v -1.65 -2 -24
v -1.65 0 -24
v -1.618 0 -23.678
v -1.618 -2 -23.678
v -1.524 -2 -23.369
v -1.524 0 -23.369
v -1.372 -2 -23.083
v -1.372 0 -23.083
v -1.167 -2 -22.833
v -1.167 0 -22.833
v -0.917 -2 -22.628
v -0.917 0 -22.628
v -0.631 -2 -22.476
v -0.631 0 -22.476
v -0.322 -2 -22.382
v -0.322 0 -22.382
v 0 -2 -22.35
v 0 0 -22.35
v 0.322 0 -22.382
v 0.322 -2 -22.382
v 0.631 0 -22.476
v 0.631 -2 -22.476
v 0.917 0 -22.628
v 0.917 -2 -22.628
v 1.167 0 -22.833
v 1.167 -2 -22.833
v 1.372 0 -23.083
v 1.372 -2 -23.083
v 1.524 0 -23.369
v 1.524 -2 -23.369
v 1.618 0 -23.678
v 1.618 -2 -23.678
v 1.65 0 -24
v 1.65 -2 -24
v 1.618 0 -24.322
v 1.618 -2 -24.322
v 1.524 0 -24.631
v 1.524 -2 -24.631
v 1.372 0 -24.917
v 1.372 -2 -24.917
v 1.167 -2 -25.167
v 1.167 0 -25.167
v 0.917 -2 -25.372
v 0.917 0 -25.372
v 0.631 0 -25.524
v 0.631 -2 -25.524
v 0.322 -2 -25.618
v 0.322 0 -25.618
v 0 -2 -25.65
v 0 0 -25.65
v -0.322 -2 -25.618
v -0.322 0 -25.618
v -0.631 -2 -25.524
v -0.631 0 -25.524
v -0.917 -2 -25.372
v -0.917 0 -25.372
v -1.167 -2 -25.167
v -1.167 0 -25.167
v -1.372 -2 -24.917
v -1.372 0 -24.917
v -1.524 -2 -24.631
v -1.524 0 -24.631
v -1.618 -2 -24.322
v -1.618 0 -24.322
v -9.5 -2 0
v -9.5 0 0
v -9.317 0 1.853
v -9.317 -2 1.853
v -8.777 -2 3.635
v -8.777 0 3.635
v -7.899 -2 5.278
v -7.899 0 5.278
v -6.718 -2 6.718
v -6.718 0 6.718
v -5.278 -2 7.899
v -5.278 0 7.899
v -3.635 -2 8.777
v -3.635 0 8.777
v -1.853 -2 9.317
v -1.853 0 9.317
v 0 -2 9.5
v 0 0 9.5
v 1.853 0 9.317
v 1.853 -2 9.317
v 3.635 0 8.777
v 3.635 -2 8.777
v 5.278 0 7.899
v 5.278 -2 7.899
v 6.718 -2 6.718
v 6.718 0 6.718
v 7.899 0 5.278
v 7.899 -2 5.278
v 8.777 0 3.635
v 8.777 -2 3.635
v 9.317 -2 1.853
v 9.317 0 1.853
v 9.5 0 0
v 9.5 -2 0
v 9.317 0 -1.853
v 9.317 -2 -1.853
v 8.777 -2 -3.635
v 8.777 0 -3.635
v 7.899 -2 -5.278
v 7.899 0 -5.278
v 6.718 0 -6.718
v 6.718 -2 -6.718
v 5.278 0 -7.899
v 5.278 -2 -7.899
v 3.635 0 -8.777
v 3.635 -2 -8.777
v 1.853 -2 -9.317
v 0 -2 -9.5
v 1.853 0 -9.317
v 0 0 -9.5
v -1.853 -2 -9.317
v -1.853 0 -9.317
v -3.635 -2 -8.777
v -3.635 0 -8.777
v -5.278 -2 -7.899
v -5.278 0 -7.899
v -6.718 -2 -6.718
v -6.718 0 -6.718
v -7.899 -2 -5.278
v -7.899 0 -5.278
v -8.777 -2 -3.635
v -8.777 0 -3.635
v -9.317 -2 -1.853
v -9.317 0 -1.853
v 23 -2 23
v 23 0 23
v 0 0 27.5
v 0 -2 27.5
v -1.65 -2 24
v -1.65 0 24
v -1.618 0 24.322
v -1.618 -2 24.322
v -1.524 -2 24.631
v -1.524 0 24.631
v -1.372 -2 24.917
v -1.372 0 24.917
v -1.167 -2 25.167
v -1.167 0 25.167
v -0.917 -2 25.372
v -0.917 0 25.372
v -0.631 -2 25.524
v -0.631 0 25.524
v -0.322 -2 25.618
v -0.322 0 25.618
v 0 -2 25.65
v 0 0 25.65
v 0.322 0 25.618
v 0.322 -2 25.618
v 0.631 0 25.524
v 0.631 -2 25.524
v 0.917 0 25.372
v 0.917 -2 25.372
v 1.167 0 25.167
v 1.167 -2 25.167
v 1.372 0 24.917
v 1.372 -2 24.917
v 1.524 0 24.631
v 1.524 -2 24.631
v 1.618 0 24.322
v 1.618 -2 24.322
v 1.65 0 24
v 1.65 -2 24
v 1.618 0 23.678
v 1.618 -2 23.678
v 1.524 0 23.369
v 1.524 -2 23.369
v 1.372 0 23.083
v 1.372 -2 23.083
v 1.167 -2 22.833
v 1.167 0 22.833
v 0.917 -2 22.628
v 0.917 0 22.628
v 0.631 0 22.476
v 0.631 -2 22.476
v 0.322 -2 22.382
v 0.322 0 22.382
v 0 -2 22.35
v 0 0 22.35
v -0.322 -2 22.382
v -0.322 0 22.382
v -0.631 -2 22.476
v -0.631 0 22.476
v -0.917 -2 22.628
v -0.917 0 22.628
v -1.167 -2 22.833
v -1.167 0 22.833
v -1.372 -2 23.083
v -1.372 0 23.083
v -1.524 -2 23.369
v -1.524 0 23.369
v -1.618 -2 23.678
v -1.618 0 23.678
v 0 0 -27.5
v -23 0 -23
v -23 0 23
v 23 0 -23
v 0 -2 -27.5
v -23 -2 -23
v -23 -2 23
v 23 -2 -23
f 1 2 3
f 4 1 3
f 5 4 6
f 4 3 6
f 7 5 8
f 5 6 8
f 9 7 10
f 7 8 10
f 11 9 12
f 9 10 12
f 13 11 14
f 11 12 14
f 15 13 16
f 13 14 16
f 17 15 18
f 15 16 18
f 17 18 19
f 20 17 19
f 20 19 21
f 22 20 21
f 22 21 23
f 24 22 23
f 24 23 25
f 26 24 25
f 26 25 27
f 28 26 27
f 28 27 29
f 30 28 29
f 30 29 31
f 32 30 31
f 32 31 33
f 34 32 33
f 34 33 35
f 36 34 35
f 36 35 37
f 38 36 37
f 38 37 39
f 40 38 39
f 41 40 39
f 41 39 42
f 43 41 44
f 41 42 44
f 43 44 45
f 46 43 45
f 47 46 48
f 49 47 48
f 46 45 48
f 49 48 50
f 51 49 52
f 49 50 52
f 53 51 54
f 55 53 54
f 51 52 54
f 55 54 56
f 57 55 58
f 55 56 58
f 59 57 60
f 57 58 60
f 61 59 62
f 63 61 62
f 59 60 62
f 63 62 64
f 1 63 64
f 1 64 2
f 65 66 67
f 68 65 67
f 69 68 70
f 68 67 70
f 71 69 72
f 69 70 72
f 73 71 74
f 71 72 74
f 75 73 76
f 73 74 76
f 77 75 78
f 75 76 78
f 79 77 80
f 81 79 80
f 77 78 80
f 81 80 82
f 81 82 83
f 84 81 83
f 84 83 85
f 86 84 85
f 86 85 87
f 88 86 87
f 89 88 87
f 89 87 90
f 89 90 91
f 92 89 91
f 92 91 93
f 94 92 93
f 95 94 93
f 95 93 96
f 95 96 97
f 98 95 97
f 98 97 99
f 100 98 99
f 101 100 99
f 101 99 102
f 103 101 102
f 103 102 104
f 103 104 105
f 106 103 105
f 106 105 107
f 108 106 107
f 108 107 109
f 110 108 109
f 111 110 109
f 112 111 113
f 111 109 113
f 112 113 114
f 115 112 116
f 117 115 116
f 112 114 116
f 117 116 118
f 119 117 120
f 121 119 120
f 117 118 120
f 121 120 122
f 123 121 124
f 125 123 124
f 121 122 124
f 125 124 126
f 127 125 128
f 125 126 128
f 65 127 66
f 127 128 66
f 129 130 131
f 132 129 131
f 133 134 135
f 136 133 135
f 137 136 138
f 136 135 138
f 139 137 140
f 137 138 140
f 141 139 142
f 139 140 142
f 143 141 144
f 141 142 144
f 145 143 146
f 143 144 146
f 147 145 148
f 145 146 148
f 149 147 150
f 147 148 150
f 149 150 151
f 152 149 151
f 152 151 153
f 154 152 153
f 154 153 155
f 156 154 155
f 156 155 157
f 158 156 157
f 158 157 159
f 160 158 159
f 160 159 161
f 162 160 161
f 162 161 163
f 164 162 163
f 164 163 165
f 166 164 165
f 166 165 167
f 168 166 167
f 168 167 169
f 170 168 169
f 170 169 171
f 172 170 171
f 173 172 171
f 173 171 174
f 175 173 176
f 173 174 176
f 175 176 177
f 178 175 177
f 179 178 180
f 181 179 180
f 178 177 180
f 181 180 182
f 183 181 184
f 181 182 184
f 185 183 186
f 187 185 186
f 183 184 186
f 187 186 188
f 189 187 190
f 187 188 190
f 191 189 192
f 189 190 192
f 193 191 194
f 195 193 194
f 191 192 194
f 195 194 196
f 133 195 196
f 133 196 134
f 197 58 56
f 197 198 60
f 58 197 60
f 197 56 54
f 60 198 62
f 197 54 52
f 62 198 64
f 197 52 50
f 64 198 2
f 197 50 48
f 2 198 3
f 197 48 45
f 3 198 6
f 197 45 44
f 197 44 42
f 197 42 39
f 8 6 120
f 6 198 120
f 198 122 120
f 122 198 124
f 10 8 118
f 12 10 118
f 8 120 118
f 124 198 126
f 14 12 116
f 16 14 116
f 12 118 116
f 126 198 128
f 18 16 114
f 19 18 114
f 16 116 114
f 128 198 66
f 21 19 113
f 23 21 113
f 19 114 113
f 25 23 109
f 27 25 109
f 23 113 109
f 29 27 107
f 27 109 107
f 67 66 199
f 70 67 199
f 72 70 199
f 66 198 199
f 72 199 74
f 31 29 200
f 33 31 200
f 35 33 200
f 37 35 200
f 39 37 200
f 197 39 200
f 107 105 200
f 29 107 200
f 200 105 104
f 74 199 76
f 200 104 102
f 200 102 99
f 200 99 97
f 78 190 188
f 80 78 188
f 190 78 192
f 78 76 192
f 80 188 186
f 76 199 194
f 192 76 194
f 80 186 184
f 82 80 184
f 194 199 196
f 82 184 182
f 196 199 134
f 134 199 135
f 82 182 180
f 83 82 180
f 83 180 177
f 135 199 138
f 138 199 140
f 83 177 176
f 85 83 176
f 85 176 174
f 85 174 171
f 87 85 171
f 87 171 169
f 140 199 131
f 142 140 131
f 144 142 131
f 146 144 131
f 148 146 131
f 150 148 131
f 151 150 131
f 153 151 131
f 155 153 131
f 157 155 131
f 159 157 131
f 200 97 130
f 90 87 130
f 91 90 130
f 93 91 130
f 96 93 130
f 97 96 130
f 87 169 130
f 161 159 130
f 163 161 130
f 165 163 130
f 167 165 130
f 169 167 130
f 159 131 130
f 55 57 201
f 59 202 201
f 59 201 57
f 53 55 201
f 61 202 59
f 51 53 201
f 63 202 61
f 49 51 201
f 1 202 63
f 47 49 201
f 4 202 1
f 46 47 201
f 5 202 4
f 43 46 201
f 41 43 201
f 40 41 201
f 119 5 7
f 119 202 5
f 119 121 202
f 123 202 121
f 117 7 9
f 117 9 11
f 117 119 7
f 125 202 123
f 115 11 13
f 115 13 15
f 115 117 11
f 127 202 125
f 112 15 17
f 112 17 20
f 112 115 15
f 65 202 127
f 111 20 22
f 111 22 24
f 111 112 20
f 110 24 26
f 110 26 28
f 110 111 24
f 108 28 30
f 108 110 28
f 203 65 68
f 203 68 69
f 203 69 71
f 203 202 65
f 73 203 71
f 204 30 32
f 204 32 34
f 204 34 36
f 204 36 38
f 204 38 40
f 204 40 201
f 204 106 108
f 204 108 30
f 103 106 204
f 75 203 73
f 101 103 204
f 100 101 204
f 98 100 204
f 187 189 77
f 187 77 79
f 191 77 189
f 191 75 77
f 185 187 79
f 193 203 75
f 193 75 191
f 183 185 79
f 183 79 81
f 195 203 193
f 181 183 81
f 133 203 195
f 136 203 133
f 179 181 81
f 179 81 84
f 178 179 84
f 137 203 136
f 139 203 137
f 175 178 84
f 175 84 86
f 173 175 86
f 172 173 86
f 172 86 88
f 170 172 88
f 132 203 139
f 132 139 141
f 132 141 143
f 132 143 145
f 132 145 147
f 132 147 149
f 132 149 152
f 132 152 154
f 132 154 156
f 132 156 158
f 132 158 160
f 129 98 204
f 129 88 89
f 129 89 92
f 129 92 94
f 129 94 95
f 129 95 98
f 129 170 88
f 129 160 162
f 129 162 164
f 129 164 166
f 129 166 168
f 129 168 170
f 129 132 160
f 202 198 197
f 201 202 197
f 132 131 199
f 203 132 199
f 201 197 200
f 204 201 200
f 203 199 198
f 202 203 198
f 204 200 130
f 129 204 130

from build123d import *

# Parameters (mm, degrees)
F1_DEPTH = 2
F2_R     = 9.5
F3_DEPTH = 25
F6_D     = 3.3


with BuildPart() as f1:
    # F0 (on Front) → F1 (new body)
    with BuildSketch(Plane.XZ):
        Polygon((23, -19), (23, 23), (-23, 23), (-23, -23), (23, -23), align=None)
        Polygon((-23, 23), (23, 23), (0, 27.5), align=None)
        Polygon((23, -23), (-23, -23), (0, -27.5), align=None)
    extrude(amount=F1_DEPTH)

    # F2 (on face) → F3 (cut)
    with BuildSketch(Plane(origin=(0, 0, 0), x_dir=(-1, 0, 0), z_dir=(0, 1, 0))):
        Circle(F2_R)
    extrude(amount=-F3_DEPTH, mode=Mode.SUBTRACT)

    # F6 (through all)
    with Locations(Plane.XZ.offset(2)):
        with Locations((0, -24), (0, 24)):
            Hole(F6_D / 2)


solid = f1.part
